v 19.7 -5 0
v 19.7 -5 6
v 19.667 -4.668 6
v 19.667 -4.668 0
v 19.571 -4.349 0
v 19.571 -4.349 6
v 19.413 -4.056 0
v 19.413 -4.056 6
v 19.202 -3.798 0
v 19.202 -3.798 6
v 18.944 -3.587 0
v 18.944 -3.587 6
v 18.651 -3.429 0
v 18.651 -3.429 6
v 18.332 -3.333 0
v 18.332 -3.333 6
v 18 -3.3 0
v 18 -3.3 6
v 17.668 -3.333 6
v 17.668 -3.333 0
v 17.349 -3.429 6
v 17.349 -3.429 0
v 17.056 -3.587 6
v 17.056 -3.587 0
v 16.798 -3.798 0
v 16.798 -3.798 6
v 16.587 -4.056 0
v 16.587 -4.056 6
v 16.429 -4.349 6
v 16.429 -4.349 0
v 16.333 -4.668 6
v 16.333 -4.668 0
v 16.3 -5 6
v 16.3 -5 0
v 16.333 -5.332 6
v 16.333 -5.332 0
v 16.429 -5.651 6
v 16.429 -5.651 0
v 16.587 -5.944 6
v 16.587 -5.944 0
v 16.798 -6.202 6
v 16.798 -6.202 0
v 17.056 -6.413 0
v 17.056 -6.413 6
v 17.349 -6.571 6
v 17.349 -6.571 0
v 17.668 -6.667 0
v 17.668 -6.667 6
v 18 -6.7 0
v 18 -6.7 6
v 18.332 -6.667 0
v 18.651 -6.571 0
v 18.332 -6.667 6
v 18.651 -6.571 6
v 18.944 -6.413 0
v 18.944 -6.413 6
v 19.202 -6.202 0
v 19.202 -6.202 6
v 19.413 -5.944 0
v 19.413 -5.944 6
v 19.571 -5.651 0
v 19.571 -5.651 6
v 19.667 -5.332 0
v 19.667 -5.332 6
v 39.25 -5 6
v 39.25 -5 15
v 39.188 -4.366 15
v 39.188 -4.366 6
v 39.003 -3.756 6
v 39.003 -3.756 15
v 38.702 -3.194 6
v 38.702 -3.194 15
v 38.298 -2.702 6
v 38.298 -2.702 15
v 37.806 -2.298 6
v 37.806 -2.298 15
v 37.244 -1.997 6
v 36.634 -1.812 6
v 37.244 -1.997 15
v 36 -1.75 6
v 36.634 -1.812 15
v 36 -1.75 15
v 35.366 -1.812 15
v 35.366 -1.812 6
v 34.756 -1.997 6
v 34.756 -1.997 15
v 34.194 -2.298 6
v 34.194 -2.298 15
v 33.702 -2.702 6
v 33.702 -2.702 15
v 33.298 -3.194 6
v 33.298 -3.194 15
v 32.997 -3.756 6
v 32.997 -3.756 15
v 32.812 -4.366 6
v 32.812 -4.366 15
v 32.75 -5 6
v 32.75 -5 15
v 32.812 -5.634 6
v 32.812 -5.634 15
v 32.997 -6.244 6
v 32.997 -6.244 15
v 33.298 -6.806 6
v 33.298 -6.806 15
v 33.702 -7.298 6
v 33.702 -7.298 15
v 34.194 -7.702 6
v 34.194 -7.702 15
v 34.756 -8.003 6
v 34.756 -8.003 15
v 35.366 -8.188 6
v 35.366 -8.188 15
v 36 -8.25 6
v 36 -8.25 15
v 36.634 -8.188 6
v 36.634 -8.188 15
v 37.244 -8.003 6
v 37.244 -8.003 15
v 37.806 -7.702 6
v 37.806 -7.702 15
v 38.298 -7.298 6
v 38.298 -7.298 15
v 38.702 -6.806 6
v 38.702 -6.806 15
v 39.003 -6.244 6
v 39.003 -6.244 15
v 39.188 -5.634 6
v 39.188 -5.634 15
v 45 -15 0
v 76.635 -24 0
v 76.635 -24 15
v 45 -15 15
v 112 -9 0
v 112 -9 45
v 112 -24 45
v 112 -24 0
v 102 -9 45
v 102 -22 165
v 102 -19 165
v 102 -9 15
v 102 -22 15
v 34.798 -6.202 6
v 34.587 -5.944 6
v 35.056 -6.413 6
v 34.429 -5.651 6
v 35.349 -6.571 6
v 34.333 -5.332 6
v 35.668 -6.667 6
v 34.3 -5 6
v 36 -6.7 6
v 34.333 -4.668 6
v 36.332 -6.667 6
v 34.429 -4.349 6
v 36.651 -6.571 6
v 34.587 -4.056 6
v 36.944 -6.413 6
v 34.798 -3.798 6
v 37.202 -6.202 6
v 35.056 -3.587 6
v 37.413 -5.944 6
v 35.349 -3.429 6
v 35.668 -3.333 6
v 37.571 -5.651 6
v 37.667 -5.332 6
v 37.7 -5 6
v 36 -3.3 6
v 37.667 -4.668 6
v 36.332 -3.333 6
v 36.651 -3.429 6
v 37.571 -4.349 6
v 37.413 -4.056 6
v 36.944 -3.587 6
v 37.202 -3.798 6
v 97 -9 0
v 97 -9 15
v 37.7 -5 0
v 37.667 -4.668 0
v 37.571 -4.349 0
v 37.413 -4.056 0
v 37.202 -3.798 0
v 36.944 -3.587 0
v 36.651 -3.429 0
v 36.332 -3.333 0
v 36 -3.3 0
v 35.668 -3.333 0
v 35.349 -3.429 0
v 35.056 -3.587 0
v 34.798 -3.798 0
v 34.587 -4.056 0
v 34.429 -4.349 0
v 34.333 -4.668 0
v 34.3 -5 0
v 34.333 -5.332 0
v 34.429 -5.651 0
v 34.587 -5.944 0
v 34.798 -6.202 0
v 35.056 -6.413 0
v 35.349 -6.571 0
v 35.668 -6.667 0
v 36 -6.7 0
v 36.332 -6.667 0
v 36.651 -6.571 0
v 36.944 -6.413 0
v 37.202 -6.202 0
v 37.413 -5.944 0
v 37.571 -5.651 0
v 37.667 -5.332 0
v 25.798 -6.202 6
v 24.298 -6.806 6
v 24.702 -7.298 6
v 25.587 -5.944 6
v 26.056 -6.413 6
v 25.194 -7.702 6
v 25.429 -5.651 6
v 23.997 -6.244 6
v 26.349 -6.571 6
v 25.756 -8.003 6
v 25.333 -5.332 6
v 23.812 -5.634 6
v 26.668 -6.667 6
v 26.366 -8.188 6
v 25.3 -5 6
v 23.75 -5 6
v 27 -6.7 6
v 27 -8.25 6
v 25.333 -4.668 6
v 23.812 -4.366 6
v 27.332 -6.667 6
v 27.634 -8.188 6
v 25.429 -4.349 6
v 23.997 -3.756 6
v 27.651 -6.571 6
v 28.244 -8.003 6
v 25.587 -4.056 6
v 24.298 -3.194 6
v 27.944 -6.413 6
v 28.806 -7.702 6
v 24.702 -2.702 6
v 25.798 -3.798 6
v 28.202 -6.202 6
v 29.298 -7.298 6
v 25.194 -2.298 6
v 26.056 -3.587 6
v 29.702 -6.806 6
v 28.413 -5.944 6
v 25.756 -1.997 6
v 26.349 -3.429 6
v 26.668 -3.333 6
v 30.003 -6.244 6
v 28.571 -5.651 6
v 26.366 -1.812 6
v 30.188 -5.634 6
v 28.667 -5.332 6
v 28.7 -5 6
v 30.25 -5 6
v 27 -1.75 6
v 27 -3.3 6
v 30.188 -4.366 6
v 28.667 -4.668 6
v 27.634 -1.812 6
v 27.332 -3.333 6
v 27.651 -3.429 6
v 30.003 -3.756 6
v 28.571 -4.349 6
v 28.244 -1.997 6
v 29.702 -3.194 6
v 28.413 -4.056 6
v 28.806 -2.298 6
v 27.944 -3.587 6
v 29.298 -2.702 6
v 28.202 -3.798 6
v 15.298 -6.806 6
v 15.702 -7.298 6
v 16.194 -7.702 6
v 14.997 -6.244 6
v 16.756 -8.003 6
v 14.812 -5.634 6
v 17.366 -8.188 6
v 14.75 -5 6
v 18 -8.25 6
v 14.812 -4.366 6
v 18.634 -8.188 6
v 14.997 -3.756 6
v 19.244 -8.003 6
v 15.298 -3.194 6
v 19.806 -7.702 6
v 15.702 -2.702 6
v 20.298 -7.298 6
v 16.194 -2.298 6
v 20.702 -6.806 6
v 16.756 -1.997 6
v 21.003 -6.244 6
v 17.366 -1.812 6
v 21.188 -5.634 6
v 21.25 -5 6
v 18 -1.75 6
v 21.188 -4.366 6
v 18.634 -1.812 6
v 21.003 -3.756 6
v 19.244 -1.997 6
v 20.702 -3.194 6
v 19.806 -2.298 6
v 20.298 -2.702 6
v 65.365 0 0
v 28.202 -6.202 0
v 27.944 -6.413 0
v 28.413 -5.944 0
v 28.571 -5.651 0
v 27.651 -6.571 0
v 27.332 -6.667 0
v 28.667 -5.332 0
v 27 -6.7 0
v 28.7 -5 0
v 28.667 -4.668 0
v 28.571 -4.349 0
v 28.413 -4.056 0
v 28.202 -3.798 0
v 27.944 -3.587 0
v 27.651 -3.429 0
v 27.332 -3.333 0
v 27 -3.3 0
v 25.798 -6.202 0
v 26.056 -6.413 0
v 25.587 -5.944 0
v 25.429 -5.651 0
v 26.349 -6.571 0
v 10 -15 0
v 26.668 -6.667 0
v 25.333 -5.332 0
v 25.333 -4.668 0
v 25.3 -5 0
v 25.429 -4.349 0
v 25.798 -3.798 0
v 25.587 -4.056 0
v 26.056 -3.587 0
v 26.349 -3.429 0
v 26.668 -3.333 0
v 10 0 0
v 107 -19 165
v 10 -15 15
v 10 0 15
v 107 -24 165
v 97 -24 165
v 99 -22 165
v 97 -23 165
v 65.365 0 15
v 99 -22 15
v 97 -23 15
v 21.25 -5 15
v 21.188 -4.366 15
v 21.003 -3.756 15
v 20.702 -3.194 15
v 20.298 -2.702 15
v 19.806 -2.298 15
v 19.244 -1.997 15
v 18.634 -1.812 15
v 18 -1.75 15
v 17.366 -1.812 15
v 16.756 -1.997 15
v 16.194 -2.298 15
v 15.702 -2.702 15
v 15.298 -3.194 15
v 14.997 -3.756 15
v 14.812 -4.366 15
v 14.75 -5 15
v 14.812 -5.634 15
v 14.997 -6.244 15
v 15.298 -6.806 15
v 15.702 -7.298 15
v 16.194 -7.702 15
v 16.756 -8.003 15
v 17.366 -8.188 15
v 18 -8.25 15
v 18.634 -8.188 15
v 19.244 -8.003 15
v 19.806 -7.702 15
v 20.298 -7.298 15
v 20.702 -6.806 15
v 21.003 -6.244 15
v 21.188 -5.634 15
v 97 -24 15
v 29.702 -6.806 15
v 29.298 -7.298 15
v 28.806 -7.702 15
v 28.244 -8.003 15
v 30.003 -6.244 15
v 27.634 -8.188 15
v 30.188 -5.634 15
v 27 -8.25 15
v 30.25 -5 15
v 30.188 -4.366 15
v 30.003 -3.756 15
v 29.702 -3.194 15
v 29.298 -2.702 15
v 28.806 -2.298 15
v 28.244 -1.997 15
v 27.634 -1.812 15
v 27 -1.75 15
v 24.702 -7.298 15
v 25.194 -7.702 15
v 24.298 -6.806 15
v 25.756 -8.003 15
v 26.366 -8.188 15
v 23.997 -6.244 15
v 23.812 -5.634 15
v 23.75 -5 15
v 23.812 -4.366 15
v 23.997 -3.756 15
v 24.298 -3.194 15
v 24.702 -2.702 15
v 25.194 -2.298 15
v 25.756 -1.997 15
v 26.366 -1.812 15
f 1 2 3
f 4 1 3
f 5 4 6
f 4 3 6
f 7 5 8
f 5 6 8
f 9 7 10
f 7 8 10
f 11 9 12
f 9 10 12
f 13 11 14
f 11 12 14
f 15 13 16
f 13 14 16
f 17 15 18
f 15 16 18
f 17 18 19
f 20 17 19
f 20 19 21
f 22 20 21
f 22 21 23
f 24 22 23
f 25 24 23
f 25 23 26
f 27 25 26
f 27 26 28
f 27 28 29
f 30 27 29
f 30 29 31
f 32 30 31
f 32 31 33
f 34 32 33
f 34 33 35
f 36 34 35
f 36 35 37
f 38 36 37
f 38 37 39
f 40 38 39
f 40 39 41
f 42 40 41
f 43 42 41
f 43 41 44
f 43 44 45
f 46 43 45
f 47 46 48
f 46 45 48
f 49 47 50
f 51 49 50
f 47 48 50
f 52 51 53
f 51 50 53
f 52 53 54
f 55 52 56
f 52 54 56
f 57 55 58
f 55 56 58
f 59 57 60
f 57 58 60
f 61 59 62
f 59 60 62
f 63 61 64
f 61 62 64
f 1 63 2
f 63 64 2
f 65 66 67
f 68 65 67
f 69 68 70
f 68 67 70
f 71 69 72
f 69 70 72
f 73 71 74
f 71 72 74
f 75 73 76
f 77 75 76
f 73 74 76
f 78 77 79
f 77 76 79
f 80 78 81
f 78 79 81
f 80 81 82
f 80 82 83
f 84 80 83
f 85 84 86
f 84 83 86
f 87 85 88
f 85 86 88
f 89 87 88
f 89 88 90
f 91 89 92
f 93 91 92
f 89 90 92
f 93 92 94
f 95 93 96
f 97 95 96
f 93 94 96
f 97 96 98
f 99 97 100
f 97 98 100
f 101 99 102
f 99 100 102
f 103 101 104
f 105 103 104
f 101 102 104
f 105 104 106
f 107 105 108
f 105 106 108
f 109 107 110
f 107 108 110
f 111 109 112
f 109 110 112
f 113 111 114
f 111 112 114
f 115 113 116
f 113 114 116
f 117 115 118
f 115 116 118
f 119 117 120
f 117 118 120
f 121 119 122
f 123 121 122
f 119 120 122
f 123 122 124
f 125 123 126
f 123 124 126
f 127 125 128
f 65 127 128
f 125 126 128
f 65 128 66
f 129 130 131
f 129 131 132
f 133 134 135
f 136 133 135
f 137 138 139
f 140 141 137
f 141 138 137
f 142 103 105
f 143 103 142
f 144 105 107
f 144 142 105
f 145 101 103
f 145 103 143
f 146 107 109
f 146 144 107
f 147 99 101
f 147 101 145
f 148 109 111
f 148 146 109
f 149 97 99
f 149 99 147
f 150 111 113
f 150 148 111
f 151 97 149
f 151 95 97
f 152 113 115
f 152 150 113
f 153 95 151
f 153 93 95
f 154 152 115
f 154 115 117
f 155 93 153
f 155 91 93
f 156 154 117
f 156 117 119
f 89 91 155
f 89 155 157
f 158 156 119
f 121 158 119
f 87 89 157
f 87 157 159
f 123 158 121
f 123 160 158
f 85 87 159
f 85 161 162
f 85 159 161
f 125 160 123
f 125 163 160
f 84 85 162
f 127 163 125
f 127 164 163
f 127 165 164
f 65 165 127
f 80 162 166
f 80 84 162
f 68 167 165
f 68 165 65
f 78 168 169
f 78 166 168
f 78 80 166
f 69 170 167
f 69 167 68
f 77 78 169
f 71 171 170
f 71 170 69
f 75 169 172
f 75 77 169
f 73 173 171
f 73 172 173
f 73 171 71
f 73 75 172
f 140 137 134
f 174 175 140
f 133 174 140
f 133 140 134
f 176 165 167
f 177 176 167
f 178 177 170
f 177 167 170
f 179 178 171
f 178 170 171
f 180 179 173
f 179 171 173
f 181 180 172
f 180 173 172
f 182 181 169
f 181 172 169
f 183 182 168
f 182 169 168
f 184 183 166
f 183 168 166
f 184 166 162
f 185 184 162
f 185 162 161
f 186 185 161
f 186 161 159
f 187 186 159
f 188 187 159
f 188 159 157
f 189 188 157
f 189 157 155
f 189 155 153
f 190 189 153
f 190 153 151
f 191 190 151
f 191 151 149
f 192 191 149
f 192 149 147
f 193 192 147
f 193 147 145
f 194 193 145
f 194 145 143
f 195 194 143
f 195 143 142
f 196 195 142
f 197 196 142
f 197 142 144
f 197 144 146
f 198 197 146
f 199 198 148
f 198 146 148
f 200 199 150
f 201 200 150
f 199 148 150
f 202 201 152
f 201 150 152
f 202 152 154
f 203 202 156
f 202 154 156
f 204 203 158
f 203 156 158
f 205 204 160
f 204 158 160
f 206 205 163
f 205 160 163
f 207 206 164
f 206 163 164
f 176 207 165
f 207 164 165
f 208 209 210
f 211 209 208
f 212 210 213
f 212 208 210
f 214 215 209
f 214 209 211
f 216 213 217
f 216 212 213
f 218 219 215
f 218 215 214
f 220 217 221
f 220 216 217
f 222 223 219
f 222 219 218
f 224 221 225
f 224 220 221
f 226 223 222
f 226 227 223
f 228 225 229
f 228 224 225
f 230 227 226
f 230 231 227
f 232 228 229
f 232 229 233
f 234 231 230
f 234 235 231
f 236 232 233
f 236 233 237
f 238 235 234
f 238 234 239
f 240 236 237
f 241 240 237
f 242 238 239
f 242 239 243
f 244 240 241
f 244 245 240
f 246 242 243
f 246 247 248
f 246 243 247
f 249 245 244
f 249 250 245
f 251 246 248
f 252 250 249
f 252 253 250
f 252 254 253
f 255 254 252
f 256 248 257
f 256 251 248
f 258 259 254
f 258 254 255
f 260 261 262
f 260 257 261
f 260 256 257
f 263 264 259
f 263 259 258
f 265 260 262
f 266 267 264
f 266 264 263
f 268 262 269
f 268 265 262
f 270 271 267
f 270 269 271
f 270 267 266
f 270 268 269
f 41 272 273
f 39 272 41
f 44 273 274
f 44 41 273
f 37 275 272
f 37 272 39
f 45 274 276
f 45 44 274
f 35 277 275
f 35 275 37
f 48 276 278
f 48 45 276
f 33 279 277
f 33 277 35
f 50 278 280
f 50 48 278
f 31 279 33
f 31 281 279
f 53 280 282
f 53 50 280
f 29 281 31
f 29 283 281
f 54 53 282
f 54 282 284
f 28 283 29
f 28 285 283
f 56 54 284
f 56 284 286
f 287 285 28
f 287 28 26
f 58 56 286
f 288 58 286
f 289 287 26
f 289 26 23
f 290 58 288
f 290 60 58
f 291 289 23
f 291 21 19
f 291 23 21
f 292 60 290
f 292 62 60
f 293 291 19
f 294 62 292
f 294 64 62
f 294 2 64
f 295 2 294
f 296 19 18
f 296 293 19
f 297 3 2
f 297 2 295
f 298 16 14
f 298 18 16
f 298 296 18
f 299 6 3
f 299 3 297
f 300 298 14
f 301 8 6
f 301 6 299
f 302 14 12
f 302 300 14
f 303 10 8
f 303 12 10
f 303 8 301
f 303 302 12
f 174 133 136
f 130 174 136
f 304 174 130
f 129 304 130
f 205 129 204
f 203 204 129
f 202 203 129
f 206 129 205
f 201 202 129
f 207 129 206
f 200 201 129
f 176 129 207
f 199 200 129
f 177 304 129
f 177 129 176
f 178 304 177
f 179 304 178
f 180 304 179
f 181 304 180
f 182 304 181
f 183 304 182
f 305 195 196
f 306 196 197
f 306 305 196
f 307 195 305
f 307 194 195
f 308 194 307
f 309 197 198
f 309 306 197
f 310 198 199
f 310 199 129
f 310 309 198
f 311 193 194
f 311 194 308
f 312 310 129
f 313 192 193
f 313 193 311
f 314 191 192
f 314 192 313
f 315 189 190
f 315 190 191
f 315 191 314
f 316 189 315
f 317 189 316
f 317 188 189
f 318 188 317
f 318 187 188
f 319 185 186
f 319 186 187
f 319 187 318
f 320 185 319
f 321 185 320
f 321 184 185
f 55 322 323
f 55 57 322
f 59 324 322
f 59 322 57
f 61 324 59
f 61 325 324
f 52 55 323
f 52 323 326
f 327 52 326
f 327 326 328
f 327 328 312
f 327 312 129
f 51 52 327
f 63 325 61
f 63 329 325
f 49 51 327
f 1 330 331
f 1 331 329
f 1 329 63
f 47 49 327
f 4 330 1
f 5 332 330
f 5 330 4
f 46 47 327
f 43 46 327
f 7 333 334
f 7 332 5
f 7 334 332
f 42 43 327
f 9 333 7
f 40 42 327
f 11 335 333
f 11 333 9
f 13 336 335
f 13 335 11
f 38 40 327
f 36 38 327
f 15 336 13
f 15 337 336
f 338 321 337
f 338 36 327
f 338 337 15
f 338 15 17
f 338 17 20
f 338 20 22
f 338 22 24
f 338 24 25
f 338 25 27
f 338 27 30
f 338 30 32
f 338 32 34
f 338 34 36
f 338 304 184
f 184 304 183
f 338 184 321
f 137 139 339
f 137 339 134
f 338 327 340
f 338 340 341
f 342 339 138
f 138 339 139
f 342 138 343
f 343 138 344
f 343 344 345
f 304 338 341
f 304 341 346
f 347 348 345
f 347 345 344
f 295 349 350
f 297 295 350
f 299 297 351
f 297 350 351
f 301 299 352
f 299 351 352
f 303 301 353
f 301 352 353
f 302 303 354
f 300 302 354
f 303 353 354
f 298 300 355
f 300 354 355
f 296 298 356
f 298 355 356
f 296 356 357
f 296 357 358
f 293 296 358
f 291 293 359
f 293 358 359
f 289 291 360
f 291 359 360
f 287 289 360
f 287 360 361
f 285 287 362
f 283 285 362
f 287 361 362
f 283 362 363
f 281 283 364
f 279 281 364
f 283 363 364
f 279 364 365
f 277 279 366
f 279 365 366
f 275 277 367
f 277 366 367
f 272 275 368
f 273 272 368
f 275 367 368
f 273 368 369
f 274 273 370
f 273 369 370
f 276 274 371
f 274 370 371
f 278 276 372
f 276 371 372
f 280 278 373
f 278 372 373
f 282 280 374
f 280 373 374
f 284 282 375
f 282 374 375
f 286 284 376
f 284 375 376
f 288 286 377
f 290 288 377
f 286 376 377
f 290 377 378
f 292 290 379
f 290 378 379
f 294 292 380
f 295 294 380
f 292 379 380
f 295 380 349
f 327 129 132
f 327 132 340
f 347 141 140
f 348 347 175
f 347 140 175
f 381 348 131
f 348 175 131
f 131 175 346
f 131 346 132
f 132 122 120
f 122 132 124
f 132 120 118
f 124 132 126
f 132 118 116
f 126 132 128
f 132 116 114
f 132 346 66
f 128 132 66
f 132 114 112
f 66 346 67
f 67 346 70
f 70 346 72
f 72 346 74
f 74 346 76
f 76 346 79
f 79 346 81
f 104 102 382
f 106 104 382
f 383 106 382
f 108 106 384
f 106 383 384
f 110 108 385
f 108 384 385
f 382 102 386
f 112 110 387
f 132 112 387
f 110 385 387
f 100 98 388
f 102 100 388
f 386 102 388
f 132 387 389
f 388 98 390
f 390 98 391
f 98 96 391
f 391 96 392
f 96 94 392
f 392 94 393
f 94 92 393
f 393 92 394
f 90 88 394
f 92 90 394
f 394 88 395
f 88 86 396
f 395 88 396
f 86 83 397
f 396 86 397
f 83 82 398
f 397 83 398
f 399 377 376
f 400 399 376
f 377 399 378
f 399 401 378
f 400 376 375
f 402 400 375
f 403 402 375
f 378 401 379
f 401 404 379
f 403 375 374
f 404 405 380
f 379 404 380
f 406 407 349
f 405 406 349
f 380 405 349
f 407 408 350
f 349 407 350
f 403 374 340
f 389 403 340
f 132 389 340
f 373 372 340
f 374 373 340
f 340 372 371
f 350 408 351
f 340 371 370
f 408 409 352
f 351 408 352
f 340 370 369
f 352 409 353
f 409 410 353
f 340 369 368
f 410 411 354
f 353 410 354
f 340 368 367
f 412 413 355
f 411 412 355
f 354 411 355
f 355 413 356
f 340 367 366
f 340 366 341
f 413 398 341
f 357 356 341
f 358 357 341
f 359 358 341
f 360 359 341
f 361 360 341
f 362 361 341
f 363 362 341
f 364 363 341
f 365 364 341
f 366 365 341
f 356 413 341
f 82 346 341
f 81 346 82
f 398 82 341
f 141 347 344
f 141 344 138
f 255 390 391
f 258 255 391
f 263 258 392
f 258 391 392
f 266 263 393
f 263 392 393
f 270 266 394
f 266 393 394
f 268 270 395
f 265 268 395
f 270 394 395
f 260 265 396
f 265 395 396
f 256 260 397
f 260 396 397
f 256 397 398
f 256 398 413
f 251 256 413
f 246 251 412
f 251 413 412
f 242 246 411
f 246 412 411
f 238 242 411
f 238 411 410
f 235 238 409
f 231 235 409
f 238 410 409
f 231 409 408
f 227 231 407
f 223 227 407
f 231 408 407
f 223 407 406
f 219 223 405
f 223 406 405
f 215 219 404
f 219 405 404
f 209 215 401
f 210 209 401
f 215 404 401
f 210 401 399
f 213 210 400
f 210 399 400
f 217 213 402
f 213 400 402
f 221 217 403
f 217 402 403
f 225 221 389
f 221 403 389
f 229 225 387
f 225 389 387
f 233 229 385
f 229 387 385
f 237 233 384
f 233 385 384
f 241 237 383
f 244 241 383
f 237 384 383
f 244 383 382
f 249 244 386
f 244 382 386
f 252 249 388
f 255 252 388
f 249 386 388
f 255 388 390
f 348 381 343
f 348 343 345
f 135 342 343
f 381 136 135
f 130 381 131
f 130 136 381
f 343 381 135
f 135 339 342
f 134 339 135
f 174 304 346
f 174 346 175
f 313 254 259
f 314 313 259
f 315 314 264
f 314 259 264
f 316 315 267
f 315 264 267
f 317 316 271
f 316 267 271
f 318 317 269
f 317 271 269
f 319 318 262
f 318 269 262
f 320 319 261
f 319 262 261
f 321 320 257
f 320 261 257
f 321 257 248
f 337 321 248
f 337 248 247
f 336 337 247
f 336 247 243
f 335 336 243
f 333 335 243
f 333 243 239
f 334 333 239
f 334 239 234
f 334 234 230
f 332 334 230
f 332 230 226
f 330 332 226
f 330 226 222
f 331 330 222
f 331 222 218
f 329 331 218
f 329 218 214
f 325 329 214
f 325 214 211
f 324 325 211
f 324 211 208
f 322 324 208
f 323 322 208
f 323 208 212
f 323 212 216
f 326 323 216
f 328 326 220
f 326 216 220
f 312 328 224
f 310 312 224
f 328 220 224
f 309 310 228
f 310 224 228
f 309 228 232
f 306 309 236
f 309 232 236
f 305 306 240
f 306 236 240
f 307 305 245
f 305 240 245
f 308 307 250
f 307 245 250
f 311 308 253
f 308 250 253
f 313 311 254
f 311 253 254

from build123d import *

# Parameters (mm, degrees)
AUFSATZ_LINEAR_AUSTRAGEN1_DEPTH = 15
AUFSATZ_LINEAR_AUSTRAGEN2_DEPTH = 150
SCHNITT_LINEAR_AUSTRAGEN1_REACH = 192.434
SCHNITT_LINEAR_AUSTRAGEN2_REACH = 190.733
SKIZZE4_R                       = 1.7
SKIZZE5_R                       = 3.25
SCHNITT_LINEAR_AUSTRAGEN3_DEPTH = 9
SCHNITT_LINEAR_AUSTRAGEN4_REACH = 201.985


with BuildPart() as part:
    # Skizze1 → Aufsatz-Linear austragen1 (new body)
    with BuildSketch(Plane.XY):
        Polygon((10, 0), (65.364729758, 0), (97, -9), (112, -9), (112, -24), (76.635270242, -24), (45, -15), (10, -15), align=None)
    extrude(amount=AUFSATZ_LINEAR_AUSTRAGEN1_DEPTH)

    # Skizze2 → Aufsatz-Linear austragen2 (add)
    with BuildSketch(Plane.XY.offset(15)):
        Polygon((112, -9), (112, -24), (97, -24), (97, -23), (99, -22), (102, -22), (102, -9), align=None)
    extrude(amount=AUFSATZ_LINEAR_AUSTRAGEN2_DEPTH)

    # Skizze3 → Schnitt-Linear austragen1 (cut, up to next)
    with BuildSketch(Plane.ZY.offset(-102), mode=Mode.PRIVATE) as schnitt_linear_austragen1_sk1:
        Polygon((165, -19), (45, -9), (165, -9), align=None)
    schnitt_linear_austragen1_tool1 = extrude(schnitt_linear_austragen1_sk1.sketch, amount=-SCHNITT_LINEAR_AUSTRAGEN1_REACH, mode=Mode.PRIVATE) & part.part
    add(schnitt_linear_austragen1_tool1.solids().sort_by_distance((102, -12.333333, 125))[0], mode=Mode.SUBTRACT)

    # Skizze4 → Schnitt-Linear austragen2 (cut, up to next)
    with BuildSketch(Plane.XY.offset(15), mode=Mode.PRIVATE) as schnitt_linear_austragen2_sk1:
        with Locations((36, -5)):
            Circle(SKIZZE4_R)
    schnitt_linear_austragen2_tool1 = extrude(schnitt_linear_austragen2_sk1.sketch, amount=-SCHNITT_LINEAR_AUSTRAGEN2_REACH, mode=Mode.PRIVATE) & part.part
    # Skizze4 → Schnitt-Linear austragen2 (cut, up to next)
    with BuildSketch(Plane.XY.offset(15), mode=Mode.PRIVATE) as schnitt_linear_austragen2_sk2:
        with Locations((27, -5)):
            Circle(SKIZZE4_R)
    schnitt_linear_austragen2_tool2 = extrude(schnitt_linear_austragen2_sk2.sketch, amount=-SCHNITT_LINEAR_AUSTRAGEN2_REACH, mode=Mode.PRIVATE) & part.part
    # Skizze4 → Schnitt-Linear austragen2 (cut, up to next)
    with BuildSketch(Plane.XY.offset(15), mode=Mode.PRIVATE) as schnitt_linear_austragen2_sk3:
        with Locations((18, -5)):
            Circle(SKIZZE4_R)
    schnitt_linear_austragen2_tool3 = extrude(schnitt_linear_austragen2_sk3.sketch, amount=-SCHNITT_LINEAR_AUSTRAGEN2_REACH, mode=Mode.PRIVATE) & part.part
    add(schnitt_linear_austragen2_tool1.solids().sort_by_distance((36, -5, 15))[0], mode=Mode.SUBTRACT)
    add(schnitt_linear_austragen2_tool2.solids().sort_by_distance((27, -5, 15))[0], mode=Mode.SUBTRACT)
    add(schnitt_linear_austragen2_tool3.solids().sort_by_distance((18, -5, 15))[0], mode=Mode.SUBTRACT)

    # Skizze5 → Schnitt-Linear austragen3 (cut)
    with BuildSketch(Plane.XY.offset(15)):
        with Locations((18, -5)):
            Circle(SKIZZE5_R)
        with Locations((27, -5)):
            Circle(SKIZZE5_R)
        with Locations((36, -5)):
            Circle(SKIZZE5_R)
    extrude(amount=-SCHNITT_LINEAR_AUSTRAGEN3_DEPTH, mode=Mode.SUBTRACT)

    # Skizze6 → Schnitt-Linear austragen4 (cut, up to next)
    with BuildSketch(Plane(origin=(0, -9, 0), x_dir=(1, 0, 0), z_dir=(0, 1, 0)), mode=Mode.PRIVATE) as schnitt_linear_austragen4_sk1:
        Polygon((112, -165), (107, -165), (112, -45), align=None)
    schnitt_linear_austragen4_tool1 = extrude(schnitt_linear_austragen4_sk1.sketch, amount=-SCHNITT_LINEAR_AUSTRAGEN4_REACH, mode=Mode.PRIVATE) & part.part
    add(schnitt_linear_austragen4_tool1.solids().sort_by_distance((110.333333, -9, 125))[0], mode=Mode.SUBTRACT)


solid = part.part
